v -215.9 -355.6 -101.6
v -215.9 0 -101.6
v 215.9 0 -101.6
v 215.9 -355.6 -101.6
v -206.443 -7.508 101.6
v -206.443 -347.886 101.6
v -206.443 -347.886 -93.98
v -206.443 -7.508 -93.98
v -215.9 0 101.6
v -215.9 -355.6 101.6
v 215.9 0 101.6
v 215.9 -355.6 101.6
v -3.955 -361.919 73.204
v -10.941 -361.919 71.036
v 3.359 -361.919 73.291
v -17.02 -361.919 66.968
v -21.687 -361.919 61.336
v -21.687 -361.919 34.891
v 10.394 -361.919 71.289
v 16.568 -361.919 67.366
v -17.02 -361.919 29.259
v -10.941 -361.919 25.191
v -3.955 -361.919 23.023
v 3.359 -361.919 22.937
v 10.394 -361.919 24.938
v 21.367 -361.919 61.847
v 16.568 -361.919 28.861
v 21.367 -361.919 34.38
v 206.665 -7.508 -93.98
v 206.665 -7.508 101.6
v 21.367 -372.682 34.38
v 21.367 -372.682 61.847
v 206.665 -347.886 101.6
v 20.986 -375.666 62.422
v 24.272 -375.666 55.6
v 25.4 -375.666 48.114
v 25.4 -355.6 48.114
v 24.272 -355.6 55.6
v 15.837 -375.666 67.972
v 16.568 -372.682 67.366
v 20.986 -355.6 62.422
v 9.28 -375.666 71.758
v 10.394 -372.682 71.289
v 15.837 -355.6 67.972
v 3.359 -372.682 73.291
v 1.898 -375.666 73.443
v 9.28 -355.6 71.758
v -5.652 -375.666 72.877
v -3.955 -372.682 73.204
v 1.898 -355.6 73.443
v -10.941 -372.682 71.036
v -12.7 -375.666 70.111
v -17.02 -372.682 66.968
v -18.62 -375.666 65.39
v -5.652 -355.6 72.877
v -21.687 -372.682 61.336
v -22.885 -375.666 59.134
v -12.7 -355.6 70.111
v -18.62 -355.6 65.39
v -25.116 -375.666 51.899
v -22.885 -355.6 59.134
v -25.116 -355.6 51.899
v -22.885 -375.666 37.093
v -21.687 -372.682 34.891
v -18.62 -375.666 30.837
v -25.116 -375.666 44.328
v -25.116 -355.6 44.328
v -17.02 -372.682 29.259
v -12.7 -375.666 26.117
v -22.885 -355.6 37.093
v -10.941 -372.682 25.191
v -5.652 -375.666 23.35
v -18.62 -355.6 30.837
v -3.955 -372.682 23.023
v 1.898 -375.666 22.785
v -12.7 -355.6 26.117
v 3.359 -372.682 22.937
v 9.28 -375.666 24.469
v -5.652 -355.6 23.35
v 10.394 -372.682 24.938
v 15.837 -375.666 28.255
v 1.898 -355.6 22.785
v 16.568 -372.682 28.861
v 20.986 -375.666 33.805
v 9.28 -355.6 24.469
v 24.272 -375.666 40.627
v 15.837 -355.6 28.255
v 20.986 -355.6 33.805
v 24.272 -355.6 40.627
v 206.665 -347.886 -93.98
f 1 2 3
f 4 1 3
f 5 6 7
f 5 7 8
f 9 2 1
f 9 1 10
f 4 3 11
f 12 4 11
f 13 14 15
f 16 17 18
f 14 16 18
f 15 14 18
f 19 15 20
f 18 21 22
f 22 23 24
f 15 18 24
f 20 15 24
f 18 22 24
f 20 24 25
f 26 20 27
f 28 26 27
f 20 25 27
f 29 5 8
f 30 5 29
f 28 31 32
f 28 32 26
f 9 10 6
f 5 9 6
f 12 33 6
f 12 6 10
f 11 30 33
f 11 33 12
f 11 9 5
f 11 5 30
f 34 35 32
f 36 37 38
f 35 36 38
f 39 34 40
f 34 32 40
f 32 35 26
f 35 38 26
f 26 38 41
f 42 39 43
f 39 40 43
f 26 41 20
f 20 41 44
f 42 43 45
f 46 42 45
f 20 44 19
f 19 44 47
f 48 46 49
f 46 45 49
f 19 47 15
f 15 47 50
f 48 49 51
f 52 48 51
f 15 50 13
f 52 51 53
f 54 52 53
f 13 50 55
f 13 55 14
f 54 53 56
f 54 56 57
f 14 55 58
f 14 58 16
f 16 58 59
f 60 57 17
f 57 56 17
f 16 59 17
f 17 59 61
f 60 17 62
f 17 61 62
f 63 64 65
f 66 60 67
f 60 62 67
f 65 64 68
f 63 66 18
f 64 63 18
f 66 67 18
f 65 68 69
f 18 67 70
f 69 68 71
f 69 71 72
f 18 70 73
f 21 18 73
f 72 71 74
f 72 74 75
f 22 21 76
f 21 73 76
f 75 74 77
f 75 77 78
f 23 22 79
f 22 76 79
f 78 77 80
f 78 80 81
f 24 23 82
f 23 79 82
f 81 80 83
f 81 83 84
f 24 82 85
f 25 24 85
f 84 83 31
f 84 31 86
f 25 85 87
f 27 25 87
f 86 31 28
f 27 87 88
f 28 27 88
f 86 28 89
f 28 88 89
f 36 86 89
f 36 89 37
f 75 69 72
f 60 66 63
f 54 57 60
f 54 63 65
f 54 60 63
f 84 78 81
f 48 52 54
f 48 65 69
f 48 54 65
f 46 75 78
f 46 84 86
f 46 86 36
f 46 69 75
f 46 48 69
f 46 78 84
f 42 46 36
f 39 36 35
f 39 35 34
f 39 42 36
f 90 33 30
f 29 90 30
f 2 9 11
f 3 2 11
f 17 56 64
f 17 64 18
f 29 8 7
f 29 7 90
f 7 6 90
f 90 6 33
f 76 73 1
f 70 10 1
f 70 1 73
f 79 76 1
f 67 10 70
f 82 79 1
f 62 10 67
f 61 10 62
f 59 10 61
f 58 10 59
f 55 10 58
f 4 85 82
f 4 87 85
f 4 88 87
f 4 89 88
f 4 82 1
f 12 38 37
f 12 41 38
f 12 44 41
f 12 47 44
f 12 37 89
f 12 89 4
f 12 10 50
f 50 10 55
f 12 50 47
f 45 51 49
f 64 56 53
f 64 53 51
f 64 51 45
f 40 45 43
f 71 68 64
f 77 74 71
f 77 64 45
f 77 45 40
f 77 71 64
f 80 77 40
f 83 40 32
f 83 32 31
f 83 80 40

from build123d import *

# Parameters (mm, degrees)
F0_W     = 431.8
F0_H     = 203.2
F1_DEPTH = 355.6
F2_W     = 413.108602
F2_H     = 340.378207
F3_DEPTH = 195.58
F4_R     = 25.4
F5_DEPTH = 20.066
F6_W     = 43.054437
F6_H     = 10.763585
F7_DEPTH = 195.581


with BuildPart() as f1:
    # F0 (on Front) → F1 (new body)
    with BuildSketch(Plane.XZ):
        Rectangle(F0_W, F0_H)
    extrude(amount=F1_DEPTH)

    # F2 (on face) → F3 (cut)
    with BuildSketch(Plane.XY.offset(101.6)):
        with Locations((0.110827, -177.696624)):
            Rectangle(F2_W, F2_H)
    extrude(amount=-F3_DEPTH, mode=Mode.SUBTRACT)

    # F4 (on face) → F5 (join)
    with BuildSketch(Plane.XZ.offset(355.6)):
        with Locations((0, 48.113549)):
            Circle(F4_R)
    extrude(amount=F5_DEPTH)

    # F6 (on face) → F7 (cut, through all)
    with BuildSketch(Plane.XY.offset(-93.98)):
        with Locations((-0.160011, -367.300331)):
            Rectangle(F6_W, F6_H)
    extrude(amount=F7_DEPTH, mode=Mode.SUBTRACT)


solid = f1.part
